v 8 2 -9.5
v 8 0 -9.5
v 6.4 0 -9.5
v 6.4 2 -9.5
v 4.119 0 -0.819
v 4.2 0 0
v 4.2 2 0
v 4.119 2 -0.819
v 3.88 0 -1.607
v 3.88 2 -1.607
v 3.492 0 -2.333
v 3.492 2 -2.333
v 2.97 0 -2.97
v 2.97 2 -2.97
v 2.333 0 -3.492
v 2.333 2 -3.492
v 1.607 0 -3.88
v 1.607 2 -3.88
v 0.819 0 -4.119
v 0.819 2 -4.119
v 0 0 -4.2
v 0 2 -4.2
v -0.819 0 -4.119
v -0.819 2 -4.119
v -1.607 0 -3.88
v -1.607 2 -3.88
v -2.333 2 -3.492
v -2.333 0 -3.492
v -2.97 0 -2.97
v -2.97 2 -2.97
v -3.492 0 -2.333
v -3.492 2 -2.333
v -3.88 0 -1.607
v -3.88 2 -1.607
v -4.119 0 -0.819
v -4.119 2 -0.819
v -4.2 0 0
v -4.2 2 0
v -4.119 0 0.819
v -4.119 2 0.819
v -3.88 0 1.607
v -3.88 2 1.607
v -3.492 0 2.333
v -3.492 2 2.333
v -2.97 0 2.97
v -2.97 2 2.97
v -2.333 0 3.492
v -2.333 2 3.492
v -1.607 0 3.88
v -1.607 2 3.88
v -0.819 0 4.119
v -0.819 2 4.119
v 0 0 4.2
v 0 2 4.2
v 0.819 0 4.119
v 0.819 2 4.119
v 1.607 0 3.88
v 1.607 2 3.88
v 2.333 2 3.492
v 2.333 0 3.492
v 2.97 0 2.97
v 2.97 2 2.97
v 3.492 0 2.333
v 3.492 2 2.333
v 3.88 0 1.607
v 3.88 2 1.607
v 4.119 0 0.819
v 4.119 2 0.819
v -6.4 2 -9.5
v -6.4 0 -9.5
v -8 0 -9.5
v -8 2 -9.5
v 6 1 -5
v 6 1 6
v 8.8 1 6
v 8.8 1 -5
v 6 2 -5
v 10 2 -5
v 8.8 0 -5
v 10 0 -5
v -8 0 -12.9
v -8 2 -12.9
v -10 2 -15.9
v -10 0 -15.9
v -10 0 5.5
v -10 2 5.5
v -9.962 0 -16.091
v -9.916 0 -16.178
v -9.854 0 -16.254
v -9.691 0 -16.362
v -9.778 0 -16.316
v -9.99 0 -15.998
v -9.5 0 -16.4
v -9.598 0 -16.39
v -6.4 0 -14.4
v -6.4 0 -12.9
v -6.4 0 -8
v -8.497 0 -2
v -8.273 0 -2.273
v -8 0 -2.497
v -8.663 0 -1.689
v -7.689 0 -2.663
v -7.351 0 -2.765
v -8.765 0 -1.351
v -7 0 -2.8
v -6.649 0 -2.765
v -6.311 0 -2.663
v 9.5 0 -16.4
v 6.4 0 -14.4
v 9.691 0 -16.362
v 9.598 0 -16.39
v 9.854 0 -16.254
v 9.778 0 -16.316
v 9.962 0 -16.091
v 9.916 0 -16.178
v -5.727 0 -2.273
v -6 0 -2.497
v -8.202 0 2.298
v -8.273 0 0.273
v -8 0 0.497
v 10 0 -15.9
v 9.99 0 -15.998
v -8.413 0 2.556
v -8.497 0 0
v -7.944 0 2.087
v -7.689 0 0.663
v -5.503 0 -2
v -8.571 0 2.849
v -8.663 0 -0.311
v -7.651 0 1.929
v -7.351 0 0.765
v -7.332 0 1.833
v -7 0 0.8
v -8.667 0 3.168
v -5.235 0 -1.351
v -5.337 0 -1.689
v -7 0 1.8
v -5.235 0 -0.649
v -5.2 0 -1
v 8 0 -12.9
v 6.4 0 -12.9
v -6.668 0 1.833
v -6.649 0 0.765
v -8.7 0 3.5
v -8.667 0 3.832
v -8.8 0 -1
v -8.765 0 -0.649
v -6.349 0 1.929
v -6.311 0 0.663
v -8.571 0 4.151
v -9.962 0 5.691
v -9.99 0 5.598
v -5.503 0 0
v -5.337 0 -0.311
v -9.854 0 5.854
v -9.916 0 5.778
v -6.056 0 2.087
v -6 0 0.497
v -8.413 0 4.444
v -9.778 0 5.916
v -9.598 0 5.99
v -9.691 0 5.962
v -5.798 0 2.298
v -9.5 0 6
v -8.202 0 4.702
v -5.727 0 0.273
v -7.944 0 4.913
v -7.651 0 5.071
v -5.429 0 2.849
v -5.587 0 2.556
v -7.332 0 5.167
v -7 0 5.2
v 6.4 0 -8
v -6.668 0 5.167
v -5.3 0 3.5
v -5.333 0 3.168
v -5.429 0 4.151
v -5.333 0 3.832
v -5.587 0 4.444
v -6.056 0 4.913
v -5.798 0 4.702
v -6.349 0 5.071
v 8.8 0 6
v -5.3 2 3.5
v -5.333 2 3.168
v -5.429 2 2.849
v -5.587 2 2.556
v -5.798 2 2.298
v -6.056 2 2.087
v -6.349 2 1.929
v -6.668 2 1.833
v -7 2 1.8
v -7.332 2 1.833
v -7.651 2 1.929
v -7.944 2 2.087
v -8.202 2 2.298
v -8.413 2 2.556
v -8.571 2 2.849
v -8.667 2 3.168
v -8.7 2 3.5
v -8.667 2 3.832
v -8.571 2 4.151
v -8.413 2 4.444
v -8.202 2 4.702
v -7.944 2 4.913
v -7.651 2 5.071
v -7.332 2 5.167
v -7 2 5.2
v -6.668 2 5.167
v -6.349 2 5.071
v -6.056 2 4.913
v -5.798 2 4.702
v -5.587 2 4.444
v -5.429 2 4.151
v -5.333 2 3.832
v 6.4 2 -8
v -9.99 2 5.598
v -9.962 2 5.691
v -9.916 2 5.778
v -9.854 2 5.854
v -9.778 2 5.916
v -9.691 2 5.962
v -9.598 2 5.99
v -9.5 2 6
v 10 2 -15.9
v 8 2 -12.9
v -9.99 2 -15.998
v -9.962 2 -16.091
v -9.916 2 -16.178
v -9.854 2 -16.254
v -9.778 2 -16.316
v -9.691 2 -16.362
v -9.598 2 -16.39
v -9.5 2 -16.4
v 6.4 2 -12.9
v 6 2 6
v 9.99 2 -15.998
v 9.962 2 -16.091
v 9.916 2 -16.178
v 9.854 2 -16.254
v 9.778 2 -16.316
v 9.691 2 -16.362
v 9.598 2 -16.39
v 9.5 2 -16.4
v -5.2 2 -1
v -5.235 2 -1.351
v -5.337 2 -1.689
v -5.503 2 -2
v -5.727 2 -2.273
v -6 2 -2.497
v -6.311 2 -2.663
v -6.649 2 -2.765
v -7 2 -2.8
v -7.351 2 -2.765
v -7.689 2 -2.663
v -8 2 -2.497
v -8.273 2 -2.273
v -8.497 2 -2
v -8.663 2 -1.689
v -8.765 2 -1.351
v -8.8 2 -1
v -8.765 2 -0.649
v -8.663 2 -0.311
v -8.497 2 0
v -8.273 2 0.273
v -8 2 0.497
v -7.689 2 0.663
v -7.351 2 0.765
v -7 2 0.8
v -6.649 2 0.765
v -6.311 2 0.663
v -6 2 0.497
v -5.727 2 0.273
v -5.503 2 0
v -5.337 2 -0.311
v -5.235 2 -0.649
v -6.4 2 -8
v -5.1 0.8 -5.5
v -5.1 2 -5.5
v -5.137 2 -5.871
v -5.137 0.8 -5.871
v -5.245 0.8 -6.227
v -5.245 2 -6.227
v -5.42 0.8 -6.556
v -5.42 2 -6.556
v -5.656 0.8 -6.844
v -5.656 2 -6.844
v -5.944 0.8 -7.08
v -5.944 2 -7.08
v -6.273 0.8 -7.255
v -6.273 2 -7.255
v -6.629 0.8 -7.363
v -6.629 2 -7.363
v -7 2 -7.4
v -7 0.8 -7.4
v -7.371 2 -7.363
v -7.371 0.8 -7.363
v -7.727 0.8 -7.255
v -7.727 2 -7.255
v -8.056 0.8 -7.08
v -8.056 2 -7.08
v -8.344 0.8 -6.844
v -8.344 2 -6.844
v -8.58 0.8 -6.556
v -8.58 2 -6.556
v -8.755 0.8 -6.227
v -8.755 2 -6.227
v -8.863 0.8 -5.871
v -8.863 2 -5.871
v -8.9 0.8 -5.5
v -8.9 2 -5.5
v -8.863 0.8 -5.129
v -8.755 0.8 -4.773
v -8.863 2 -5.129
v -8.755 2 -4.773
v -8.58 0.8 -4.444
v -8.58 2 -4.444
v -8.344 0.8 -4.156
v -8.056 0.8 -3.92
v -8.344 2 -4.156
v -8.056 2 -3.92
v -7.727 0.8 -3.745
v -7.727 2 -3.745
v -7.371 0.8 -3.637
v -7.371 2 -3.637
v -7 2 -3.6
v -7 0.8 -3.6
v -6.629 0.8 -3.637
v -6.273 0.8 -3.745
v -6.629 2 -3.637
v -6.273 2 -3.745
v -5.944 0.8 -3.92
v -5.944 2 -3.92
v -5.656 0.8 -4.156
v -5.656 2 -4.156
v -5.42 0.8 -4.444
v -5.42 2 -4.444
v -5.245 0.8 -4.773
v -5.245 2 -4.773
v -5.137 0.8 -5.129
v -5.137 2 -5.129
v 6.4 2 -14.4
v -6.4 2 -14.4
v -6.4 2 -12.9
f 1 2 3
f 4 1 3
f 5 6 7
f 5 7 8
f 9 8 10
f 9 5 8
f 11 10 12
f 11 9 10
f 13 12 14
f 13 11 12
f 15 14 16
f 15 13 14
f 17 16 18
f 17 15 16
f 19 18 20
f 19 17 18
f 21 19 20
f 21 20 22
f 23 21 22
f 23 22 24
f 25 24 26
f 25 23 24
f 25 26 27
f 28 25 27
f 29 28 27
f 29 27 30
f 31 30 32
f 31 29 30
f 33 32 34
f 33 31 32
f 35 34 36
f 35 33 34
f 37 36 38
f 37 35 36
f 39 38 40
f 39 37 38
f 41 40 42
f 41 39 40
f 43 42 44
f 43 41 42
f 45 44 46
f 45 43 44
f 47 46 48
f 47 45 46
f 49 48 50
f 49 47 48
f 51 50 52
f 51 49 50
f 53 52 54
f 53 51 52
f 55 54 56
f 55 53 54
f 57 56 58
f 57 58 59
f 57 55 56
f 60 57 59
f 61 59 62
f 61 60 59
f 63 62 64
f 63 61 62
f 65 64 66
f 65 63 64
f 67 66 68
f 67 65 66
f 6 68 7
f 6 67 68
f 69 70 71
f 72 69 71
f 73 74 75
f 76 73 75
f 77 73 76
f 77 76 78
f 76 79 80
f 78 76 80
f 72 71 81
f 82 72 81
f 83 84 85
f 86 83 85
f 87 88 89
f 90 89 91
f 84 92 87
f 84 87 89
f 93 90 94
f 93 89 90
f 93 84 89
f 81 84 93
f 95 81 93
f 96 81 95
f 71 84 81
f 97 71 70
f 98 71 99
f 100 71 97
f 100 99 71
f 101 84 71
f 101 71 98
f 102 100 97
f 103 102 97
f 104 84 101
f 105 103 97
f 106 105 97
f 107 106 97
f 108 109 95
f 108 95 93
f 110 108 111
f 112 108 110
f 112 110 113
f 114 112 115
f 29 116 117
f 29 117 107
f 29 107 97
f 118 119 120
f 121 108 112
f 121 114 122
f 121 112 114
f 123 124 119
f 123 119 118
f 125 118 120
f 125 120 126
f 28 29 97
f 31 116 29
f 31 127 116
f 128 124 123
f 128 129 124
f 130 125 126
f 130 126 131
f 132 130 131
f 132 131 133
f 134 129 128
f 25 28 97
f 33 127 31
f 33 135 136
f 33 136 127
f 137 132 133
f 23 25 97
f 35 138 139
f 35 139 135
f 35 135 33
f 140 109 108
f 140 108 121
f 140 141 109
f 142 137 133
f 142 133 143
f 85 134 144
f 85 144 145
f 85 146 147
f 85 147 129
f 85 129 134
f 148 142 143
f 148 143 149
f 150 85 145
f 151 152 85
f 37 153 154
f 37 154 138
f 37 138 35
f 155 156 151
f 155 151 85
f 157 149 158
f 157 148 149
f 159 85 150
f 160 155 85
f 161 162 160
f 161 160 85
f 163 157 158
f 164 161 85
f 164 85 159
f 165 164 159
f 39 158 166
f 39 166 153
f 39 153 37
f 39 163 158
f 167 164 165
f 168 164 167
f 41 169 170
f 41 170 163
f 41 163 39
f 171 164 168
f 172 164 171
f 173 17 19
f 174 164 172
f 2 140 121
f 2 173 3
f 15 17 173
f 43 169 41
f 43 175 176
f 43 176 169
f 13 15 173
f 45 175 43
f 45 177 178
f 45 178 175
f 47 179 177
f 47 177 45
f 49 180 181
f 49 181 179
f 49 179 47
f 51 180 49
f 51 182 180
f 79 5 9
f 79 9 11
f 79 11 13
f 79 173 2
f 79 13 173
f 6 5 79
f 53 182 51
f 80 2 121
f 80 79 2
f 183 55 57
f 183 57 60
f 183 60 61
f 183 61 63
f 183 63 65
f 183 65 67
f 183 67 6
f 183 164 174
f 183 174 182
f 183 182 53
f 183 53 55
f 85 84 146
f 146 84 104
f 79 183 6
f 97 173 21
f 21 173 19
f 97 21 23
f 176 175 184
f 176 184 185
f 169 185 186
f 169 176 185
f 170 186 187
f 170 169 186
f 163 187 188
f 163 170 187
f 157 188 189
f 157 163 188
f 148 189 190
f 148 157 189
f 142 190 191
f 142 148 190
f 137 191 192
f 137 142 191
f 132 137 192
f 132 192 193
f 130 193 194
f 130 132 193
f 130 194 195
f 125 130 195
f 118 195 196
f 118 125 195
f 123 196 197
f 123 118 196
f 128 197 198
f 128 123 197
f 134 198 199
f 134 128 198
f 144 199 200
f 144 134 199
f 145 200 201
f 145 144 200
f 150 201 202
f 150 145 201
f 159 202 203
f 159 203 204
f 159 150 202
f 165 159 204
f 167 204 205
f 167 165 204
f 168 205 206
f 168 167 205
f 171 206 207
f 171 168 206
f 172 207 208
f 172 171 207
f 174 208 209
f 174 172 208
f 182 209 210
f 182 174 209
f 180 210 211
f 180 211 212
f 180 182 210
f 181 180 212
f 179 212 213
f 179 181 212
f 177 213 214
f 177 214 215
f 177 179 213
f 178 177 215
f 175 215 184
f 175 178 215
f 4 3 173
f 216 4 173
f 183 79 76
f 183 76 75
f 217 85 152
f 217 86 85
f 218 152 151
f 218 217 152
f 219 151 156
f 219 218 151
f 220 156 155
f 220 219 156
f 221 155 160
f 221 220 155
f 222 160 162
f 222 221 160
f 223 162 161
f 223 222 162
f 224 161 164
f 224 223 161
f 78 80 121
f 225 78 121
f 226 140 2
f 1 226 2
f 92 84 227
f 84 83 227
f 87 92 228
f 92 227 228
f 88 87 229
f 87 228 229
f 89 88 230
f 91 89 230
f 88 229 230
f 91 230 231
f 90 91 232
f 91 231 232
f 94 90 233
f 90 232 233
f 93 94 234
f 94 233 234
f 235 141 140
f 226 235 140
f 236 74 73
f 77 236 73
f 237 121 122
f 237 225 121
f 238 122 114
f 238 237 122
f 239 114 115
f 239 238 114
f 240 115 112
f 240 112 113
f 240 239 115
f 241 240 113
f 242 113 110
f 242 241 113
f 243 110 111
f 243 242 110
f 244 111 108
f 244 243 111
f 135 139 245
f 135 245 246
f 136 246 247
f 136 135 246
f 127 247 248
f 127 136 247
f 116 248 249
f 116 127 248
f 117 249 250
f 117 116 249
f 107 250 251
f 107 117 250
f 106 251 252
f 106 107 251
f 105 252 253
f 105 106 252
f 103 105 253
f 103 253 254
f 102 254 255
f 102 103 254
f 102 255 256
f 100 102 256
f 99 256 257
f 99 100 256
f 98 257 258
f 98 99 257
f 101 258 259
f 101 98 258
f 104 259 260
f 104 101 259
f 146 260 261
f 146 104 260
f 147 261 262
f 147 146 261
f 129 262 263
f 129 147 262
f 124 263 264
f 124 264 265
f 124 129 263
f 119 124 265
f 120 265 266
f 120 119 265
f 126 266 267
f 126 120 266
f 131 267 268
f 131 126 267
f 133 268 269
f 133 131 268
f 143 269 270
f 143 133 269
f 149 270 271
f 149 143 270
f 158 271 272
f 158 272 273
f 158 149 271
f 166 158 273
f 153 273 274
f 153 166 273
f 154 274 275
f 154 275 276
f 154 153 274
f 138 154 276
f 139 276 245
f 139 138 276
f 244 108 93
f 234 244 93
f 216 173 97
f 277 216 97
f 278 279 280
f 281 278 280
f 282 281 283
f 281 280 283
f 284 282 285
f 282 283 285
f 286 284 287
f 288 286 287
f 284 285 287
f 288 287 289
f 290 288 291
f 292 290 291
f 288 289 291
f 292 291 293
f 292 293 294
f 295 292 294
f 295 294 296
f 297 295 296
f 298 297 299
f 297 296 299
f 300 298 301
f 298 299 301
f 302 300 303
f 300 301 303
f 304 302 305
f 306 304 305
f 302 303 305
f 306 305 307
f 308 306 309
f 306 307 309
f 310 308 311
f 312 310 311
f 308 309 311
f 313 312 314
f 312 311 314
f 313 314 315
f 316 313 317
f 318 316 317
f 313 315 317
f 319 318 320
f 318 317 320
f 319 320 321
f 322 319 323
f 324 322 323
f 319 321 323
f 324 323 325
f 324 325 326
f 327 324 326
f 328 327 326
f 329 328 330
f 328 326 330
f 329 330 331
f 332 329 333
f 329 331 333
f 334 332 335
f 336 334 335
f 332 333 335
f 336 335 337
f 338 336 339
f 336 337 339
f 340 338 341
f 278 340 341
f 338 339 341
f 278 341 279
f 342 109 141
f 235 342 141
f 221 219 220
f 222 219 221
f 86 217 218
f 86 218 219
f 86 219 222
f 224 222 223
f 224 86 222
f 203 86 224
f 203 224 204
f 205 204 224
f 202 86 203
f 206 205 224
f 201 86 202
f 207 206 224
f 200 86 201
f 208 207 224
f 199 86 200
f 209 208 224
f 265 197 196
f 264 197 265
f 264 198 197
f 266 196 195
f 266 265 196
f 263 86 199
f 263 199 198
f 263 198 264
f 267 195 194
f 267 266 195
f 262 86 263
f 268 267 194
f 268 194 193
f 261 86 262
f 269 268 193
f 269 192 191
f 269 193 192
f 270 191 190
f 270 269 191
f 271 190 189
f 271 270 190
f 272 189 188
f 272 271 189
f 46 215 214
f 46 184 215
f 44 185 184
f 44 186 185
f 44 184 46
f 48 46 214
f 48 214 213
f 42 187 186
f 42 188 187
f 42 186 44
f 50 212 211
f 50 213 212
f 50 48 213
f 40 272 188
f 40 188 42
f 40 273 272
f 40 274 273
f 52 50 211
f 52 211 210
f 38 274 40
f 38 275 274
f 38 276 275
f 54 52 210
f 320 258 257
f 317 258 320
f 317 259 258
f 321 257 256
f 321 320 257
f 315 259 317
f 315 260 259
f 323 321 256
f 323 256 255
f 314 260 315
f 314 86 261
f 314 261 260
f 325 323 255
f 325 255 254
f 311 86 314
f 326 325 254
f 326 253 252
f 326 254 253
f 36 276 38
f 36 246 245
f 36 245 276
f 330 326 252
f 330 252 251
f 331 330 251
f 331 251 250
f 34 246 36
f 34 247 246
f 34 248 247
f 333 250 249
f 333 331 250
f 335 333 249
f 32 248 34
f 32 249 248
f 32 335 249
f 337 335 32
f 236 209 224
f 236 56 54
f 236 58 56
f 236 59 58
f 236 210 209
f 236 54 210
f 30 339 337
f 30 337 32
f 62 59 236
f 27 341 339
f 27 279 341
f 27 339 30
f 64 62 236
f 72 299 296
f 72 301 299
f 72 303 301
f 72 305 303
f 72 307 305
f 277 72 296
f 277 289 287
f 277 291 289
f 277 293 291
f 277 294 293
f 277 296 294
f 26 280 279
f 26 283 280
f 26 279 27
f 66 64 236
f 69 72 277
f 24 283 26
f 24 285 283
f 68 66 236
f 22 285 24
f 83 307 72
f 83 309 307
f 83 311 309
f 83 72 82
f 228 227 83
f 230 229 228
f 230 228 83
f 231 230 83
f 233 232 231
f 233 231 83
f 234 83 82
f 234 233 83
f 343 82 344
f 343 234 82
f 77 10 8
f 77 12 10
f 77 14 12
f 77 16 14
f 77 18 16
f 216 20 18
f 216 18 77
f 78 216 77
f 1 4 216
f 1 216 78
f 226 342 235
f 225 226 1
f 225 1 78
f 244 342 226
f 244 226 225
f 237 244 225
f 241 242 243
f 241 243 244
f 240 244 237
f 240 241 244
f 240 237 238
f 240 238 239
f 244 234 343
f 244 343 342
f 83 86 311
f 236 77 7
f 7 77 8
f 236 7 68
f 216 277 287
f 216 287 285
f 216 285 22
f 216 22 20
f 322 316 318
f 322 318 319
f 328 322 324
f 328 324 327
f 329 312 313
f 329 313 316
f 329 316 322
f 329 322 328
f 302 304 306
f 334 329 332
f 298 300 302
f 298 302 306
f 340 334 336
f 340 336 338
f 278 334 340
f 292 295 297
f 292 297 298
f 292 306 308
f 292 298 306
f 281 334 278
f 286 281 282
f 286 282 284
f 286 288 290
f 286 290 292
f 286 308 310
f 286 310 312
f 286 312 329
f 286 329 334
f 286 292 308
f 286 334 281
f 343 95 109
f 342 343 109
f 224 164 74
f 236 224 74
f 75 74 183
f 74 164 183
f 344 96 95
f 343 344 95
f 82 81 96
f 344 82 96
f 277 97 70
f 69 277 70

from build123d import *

# Parameters (mm, degrees)
ESQUISSE1_R             = 1.7
ESQUISSE1_R_2           = 1.8
ESQUISSE1_R_3           = 4.2
BOSS_EXTRU_1_DEPTH      = 2
ESQUISSE2_R             = 1.9
ENL_V_MAT_EXTRU_1_DEPTH = 1.2
ESQUISSE4_W             = 2.8
ESQUISSE4_H             = 11
BOSS_EXTRU_3_DEPTH      = 1
CONG_1_R                = 0.5


with BuildPart() as part:
    # Esquisse1 → Boss.-Extru.1 (new body)
    with BuildSketch(Plane(origin=(0, 0, 0), x_dir=(1, 0, 0), z_dir=(0, 1, 0))):
        Polygon((10, 16.4), (-10, 16.4), (-10, -6), (6, -6), (6, 5), (10, 5), align=None)
        with Locations((-7, -3.5)):
            Circle(ESQUISSE1_R, mode=Mode.SUBTRACT)
        with Locations((-7, 1)):
            Circle(ESQUISSE1_R_2, mode=Mode.SUBTRACT)
        Circle(ESQUISSE1_R_3, mode=Mode.SUBTRACT)
        Polygon((-6.4, 12.9), (-6.4, 14.4), (6.4, 14.4), (6.4, 12.9), (8, 12.9), (8, 9.5), (6.4, 9.5), (6.4, 8), (-6.4, 8), (-6.4, 9.5), (-8, 9.5), (-8, 12.9), align=None, mode=Mode.SUBTRACT)
    extrude(amount=BOSS_EXTRU_1_DEPTH)

    # Esquisse2 → Enlèv. mat.-Extru.1 (cut)
    with BuildSketch(Plane(origin=(0, 2, 0), x_dir=(1, 0, 0), z_dir=(0, 1, 0))):
        with Locations((-7, 5.5)):
            Circle(ESQUISSE2_R)
    extrude(amount=-ENL_V_MAT_EXTRU_1_DEPTH, mode=Mode.SUBTRACT)

    # Esquisse4 → Boss.-Extru.3 (add)
    with BuildSketch(Plane.XZ):
        with Locations((7.4, 0.5)):
            Rectangle(ESQUISSE4_W, ESQUISSE4_H)
    extrude(amount=-BOSS_EXTRU_3_DEPTH)

    # Congé1
    cong_1_edges = [part.edges().sort_by_distance(p)[0] for p in [
        (-10, 1, 6),
        (-10, 1, -16.4),
        (10, 1, -16.4),
    ]]
    fillet(cong_1_edges, radius=CONG_1_R)


solid = part.part
